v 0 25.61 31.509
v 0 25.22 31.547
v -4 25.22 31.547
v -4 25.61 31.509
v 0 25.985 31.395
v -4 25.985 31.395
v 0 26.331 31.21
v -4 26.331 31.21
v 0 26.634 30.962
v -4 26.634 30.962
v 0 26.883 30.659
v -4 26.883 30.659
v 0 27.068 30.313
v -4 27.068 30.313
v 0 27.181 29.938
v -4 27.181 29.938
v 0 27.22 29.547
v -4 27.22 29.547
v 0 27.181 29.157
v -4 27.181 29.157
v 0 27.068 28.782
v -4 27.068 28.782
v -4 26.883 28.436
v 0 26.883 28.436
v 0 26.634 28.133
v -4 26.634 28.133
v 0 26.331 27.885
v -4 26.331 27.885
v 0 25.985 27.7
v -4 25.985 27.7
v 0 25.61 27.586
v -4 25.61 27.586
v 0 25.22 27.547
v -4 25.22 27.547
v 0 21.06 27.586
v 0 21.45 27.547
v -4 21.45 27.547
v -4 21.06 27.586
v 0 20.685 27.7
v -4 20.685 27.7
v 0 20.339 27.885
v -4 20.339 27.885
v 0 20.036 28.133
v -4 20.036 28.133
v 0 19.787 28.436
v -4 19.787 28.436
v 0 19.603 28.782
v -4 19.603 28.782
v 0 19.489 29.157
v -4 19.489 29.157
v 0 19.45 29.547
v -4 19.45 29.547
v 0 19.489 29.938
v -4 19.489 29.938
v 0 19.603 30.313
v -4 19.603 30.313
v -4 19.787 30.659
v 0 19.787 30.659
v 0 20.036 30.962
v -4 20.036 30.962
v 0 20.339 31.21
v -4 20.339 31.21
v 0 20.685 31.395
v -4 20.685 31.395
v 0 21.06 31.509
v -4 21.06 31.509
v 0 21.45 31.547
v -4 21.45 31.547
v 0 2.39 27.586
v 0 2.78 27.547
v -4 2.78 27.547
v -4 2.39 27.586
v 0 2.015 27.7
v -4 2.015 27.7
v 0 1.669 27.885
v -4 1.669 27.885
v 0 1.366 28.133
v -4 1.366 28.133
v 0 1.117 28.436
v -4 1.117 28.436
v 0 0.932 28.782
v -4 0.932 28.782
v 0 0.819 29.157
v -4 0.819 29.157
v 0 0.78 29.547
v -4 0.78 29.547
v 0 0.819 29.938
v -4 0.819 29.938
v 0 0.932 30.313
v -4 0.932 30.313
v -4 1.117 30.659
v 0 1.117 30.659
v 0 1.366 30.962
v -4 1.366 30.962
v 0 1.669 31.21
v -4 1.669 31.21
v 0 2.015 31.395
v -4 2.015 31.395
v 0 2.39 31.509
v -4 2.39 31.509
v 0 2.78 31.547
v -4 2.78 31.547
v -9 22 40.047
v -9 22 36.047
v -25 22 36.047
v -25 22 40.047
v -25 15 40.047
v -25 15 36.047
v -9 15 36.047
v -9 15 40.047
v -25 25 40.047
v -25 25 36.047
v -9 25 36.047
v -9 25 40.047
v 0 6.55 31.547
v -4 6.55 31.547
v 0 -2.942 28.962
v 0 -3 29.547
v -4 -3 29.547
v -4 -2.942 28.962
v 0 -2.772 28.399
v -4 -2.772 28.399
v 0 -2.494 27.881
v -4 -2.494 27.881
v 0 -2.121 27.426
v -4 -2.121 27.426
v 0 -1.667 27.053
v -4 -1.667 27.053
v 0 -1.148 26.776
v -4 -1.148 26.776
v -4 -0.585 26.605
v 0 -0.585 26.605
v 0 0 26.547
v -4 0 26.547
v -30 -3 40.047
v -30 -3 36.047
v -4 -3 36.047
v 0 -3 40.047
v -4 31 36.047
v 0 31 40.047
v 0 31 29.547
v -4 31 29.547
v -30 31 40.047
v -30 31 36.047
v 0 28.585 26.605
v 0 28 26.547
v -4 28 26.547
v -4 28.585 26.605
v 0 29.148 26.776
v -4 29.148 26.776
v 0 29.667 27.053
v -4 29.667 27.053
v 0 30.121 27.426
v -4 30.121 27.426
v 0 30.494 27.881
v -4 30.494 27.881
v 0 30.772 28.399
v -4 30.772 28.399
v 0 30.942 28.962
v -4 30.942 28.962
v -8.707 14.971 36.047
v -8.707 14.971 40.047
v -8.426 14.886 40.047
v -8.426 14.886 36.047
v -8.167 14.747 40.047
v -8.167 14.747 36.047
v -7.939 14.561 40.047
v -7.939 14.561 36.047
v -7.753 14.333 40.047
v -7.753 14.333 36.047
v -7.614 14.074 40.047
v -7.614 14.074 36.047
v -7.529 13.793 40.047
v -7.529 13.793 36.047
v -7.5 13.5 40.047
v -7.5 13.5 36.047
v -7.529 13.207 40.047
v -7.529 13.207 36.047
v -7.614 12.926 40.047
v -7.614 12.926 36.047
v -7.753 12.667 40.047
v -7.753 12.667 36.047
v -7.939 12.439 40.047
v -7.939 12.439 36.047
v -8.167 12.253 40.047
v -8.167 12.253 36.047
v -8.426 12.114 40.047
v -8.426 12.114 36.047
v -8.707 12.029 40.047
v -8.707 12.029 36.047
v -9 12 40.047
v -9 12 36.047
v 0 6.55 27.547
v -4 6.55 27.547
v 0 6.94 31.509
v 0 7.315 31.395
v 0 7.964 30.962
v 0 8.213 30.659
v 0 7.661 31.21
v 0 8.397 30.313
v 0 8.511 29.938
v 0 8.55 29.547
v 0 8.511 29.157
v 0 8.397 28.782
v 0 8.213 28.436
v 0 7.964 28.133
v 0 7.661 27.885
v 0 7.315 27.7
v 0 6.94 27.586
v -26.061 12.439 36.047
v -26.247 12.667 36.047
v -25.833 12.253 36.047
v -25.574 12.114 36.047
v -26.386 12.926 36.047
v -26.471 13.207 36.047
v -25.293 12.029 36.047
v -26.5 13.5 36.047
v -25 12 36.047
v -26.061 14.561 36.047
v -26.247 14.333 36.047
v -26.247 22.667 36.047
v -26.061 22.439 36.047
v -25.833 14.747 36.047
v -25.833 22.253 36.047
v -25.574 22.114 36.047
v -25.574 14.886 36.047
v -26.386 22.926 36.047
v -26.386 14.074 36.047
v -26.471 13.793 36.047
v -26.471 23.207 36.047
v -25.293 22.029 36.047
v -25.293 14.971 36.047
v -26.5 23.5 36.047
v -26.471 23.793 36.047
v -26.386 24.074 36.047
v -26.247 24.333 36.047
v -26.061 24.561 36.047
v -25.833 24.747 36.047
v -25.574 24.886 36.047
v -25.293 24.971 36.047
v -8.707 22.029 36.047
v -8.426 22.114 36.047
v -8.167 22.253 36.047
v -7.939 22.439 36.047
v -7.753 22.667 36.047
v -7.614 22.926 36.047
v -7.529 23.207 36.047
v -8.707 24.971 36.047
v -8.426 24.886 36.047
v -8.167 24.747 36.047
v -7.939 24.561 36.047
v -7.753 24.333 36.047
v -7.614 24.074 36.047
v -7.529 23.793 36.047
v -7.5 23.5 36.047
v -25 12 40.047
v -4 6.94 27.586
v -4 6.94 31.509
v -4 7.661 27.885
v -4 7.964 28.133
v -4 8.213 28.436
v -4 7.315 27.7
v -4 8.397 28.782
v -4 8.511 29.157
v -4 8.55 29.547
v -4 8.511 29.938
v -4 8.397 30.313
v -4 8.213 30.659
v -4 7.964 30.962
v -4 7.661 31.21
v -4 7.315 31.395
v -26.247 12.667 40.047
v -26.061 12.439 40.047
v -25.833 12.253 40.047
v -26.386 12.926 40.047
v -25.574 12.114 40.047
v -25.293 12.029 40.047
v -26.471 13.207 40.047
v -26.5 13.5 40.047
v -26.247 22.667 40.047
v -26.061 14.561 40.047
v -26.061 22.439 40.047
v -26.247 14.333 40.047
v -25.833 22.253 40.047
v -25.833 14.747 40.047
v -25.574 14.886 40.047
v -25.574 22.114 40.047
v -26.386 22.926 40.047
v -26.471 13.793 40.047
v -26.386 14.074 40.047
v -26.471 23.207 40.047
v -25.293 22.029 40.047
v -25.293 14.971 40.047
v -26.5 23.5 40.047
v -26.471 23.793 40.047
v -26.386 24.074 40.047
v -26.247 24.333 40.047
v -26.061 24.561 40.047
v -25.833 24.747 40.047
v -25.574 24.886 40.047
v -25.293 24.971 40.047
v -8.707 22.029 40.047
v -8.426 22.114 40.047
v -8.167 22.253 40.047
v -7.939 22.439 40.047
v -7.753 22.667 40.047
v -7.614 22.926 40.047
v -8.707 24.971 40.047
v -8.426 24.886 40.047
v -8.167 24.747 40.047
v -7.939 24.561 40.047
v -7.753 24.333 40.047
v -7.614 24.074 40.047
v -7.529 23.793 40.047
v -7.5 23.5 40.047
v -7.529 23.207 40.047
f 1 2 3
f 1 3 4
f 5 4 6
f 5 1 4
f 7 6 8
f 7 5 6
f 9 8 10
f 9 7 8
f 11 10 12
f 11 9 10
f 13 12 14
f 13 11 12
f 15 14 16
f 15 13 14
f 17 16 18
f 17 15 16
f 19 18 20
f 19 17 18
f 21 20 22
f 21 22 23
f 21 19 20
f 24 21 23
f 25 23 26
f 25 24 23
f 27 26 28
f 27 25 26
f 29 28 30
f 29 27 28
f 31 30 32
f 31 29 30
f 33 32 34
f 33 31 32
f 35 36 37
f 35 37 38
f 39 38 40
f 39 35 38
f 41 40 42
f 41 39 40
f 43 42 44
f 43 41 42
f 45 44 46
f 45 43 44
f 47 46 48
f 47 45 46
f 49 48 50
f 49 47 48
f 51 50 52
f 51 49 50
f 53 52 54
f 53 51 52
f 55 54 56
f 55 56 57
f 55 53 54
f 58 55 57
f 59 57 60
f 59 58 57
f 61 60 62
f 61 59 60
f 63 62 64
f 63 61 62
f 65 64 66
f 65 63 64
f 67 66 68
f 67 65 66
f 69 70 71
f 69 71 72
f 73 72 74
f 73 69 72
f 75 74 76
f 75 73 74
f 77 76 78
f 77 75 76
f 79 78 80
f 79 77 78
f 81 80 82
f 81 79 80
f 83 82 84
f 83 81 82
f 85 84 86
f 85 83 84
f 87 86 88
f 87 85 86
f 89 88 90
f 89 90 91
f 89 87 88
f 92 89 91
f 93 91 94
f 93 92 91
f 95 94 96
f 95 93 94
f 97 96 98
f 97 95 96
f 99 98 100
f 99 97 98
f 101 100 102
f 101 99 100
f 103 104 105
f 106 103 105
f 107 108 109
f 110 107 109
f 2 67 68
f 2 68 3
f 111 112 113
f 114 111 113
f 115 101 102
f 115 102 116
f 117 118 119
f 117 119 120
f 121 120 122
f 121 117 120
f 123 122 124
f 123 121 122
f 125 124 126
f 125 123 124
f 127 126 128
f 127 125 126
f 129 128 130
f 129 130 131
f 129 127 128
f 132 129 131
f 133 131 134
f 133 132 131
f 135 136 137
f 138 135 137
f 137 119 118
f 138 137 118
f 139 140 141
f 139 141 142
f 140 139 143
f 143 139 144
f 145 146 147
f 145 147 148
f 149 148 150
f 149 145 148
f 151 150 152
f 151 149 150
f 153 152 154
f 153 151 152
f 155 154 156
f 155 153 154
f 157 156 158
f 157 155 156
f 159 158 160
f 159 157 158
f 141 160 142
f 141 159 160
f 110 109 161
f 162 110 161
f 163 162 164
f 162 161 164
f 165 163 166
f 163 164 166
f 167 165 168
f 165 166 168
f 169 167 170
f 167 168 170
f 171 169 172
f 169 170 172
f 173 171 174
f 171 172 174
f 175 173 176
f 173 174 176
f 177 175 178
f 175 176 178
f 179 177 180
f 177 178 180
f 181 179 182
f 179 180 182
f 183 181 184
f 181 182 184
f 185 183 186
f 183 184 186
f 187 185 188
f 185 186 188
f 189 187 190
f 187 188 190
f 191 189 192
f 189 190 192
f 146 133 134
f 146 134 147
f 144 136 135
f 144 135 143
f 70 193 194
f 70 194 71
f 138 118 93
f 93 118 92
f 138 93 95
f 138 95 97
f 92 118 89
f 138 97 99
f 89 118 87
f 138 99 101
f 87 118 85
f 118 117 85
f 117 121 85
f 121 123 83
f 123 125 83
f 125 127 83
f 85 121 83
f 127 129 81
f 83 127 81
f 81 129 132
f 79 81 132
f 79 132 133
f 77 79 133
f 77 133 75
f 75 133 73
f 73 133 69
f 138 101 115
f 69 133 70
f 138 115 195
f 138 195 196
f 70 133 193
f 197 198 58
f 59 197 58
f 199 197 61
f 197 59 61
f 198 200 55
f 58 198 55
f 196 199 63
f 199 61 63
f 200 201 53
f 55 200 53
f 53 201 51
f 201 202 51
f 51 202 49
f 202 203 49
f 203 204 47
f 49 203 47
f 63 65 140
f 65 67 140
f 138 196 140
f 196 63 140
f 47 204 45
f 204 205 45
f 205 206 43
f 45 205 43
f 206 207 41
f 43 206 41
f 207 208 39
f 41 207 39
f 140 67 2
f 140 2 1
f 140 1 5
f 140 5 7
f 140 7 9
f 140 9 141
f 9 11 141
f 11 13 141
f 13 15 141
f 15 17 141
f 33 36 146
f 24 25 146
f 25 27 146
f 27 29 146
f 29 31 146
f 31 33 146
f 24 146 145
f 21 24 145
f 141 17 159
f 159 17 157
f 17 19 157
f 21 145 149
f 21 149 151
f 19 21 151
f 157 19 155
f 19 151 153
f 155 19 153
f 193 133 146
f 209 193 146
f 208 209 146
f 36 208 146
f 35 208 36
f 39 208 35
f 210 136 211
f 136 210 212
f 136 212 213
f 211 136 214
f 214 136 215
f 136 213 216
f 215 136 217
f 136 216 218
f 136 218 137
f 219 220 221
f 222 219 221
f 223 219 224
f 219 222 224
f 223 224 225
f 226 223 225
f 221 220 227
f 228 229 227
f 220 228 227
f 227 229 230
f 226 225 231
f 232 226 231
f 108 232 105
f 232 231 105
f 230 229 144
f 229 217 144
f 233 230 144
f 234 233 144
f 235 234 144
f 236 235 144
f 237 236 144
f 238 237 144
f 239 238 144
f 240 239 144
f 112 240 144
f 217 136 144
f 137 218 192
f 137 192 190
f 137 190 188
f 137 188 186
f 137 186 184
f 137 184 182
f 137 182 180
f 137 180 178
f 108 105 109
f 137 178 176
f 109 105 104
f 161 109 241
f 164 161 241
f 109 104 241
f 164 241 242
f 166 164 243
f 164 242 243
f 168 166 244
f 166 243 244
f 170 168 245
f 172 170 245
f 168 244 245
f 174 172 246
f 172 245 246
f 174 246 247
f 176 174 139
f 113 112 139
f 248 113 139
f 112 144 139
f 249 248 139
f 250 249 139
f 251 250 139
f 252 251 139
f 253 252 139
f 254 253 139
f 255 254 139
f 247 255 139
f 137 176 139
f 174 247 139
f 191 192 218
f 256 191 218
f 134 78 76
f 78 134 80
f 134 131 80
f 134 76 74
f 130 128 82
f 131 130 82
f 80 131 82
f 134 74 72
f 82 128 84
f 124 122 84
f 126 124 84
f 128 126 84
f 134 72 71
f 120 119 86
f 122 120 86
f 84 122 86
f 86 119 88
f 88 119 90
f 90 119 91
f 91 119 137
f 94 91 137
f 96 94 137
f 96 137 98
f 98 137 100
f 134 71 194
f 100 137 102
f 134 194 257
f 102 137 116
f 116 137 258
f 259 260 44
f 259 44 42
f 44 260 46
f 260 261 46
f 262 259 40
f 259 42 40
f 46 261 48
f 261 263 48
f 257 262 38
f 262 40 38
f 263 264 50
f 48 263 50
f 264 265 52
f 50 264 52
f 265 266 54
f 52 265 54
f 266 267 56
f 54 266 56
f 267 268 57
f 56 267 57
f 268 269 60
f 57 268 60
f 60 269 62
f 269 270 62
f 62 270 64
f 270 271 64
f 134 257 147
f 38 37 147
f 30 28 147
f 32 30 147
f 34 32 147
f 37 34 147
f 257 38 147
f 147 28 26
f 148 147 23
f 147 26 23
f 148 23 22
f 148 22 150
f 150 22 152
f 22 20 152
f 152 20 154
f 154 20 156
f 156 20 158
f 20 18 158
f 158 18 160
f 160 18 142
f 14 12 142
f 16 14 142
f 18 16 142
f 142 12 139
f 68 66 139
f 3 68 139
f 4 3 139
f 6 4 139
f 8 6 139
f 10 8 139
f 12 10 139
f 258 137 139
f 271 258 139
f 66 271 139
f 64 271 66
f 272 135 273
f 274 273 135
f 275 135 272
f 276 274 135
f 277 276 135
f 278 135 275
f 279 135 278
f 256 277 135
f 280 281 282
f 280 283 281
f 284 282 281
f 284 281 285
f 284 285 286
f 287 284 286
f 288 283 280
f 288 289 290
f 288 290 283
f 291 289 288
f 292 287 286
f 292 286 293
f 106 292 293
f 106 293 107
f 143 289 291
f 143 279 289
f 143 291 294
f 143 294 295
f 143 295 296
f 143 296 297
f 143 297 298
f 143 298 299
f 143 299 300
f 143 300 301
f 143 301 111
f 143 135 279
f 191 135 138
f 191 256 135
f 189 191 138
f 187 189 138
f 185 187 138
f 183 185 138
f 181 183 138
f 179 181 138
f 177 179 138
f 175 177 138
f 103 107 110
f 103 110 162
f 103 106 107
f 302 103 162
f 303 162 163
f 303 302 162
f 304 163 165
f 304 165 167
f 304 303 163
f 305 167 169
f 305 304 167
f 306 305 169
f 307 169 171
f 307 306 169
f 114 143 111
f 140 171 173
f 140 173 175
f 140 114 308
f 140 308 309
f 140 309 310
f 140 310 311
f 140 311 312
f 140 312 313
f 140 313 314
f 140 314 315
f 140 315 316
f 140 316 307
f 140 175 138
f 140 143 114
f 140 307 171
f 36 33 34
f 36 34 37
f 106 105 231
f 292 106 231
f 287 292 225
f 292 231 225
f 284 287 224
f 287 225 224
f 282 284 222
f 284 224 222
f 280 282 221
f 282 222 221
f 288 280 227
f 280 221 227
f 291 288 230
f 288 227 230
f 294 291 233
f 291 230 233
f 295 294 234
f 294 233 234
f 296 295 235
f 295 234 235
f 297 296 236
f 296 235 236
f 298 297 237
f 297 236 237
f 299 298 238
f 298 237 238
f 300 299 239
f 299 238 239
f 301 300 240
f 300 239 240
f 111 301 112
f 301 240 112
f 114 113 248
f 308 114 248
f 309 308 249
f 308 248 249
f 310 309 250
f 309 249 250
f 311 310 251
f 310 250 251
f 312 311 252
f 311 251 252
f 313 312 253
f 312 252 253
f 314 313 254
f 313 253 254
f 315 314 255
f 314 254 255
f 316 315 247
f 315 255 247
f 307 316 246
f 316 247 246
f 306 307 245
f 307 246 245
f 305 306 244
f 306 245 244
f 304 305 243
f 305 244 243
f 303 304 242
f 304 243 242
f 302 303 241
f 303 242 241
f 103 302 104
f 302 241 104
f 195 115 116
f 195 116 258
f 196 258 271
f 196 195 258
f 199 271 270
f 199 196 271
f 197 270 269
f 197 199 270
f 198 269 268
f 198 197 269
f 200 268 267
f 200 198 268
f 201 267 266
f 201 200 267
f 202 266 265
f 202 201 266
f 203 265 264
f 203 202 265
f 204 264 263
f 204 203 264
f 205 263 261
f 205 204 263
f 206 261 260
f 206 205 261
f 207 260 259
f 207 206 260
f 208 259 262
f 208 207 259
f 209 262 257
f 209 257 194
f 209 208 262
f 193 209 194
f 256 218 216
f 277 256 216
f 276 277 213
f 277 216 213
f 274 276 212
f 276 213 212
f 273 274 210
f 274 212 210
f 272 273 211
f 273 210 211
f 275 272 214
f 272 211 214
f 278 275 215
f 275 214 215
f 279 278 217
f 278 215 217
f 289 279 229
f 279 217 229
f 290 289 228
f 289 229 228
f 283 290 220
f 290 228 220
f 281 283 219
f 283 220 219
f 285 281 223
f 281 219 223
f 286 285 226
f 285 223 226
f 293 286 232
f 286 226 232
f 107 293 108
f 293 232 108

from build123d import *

# Parameters (mm, degrees)
F1_DEPTH = 4
F2_W     = 4
F2_H     = 34
F2_W_2   = 26
F3_DEPTH = 4


# Not quite as in the source:
# - a feature names something its author has since deleted; it is built from what else it names


with BuildPart() as f1:
    # F0 (on Right) → F1 (new body)
    with BuildSketch(Plane.YZ):
        with BuildLine():
            ThreePointArc((-3, 29.5474529266), (-2.1213203436, 31.6687732702), (0, 32.5474529266))
            Line((0, 32.5474529266), (28, 32.5474529266))
            ThreePointArc((28, 32.5474529266), (30.1213203436, 31.6687732702), (31, 29.5474529266))
            Line((31, 29.5474529266), (31, 36.0474529266))
            Line((31, 36.0474529266), (-3, 36.0474529266))
            Line((-3, 36.0474529266), (-3, 29.5474529266))
        make_face()
        with BuildLine():
            Line((28, 32.5474529266), (0, 32.5474529266))
            ThreePointArc((0, 32.5474529266), (-2.1213203436, 31.6687732702), (-3, 29.5474529266))
            ThreePointArc((-3, 29.5474529266), (-2.1213203436, 27.4261325831), (0, 26.5474529266))
            Line((0, 26.5474529266), (28, 26.5474529266))
            ThreePointArc((28, 26.5474529266), (30.1213203436, 27.4261325831), (31, 29.5474529266))
            ThreePointArc((31, 29.5474529266), (30.1213203436, 31.6687732702), (28, 32.5474529266))
        make_face()
        with BuildLine():
            ThreePointArc((2.7801140677, 27.5474529266), (0.7801140677, 29.5474529266), (2.7801140677, 31.5474529266))
            Line((2.7801140677, 31.5474529266), (6.5496175084, 31.5474529266))
            ThreePointArc((6.5496175084, 31.5474529266), (8.5496175084, 29.5474529266), (6.5496175084, 27.5474529266))
            Line((6.5496175084, 27.5474529266), (2.7801140677, 27.5474529266))
        make_face(mode=Mode.SUBTRACT)
        with BuildLine():
            Line((21.4503824916, 31.5474529266), (25.2198859323, 31.5474529266))
            ThreePointArc((25.2198859323, 31.5474529266), (27.2198859323, 29.5474529266), (25.2198859323, 27.5474529266))
            Line((25.2198859323, 27.5474529266), (21.4503824916, 27.5474529266))
            ThreePointArc((21.4503824916, 27.5474529266), (19.4503824916, 29.5474529266), (21.4503824916, 31.5474529266))
        make_face(mode=Mode.SUBTRACT)
    extrude(amount=-F1_DEPTH)

    # F2 (on face) → F3 (join)
    with BuildSketch(Plane.XY.offset(36.0474529266)):
        with Locations((-2, 14)):
            Rectangle(F2_W, F2_H)
        with Locations((-17, 14)):
            Rectangle(F2_W_2, F2_H)
        with BuildLine():
            ThreePointArc((-9, 15), (-7.5, 13.5), (-9, 12))
            Line((-9, 12), (-25, 12))
            ThreePointArc((-25, 12), (-26.5, 13.5), (-25, 15))
            Line((-25, 15), (-9, 15))
        make_face(mode=Mode.SUBTRACT)
        with BuildLine():
            ThreePointArc((-9, 25), (-7.5, 23.5), (-9, 22))
            Line((-9, 22), (-25, 22))
            ThreePointArc((-25, 22), (-26.5, 23.5), (-25, 25))
            Line((-25, 25), (-9, 25))
        make_face(mode=Mode.SUBTRACT)
    extrude(amount=F3_DEPTH)


solid = f1.part
